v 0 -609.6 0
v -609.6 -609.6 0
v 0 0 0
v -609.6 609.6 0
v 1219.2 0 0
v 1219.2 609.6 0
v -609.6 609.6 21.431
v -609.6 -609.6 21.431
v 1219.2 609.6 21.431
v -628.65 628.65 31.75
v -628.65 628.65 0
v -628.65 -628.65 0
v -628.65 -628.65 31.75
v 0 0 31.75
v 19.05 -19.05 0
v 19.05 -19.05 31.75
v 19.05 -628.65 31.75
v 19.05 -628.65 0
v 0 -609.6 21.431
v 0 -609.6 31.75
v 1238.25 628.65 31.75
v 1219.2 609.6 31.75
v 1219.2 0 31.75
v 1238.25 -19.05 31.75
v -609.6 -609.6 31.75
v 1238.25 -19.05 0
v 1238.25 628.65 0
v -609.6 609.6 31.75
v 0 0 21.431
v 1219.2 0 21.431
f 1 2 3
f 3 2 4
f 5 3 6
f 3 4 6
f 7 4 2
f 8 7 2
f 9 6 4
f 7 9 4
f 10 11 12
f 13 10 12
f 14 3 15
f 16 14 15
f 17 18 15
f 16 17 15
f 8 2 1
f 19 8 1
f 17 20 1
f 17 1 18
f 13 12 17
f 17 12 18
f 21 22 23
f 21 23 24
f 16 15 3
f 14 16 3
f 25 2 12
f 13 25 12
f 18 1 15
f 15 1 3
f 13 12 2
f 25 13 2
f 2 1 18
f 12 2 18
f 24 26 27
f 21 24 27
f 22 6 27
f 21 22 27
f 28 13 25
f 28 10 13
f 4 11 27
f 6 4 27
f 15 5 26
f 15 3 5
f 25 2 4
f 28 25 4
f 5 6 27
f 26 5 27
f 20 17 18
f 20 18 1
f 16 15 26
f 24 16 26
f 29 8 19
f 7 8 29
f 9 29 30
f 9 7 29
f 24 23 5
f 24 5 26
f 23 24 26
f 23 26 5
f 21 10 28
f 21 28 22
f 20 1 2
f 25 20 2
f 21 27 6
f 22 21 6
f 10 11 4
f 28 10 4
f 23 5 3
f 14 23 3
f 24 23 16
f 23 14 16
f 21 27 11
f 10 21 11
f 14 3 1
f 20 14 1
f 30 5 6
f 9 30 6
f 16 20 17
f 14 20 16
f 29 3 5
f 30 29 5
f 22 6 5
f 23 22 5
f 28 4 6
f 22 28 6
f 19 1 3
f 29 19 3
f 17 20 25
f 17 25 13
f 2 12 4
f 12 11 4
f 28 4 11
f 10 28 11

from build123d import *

# Parameters (mm, degrees)
F1_DEPTH = 21.43125
F2_DEPTH = 31.75
F3_DEPTH = 31.75
F4_DEPTH = 31.75
F5_DEPTH = 31.75
F6_DEPTH = 31.75
F7_DEPTH = 31.75


with BuildPart() as f1:
    # F0 (on Top) → F1 (new body)
    with BuildSketch(Plane.XY):
        Polygon((-609.6, 609.6), (-609.6, -609.6), (0, -609.6), (0, 0), (1219.2, 0), (1219.2, 609.6), align=None)
    extrude(amount=F1_DEPTH)


with BuildPart() as f2:
    # F0 (on Top) → F2 (new body)
    with BuildSketch(Plane.XY):
        Polygon((-628.65, -628.65), (-609.6, -609.6), (-609.6, 609.6), (-628.65, 628.65), align=None)
    extrude(amount=F2_DEPTH)


with BuildPart() as f3:
    # F0 (on Top) → F3 (new body)
    with BuildSketch(Plane.XY):
        Polygon((0, -609.6), (-609.6, -609.6), (-628.65, -628.65), (19.05, -628.65), align=None)
    extrude(amount=F3_DEPTH)


with BuildPart() as f4:
    # F0 (on Top) → F4 (new body)
    with BuildSketch(Plane.XY):
        Polygon((0, 0), (0, -609.6), (19.05, -628.65), (19.05, -19.05), align=None)
    extrude(amount=F4_DEPTH)


with BuildPart() as f5:
    # F0 (on Top) → F5 (new body)
    with BuildSketch(Plane.XY):
        Polygon((1219.2, 0), (0, 0), (19.05, -19.05), (1238.25, -19.05), align=None)
    extrude(amount=F5_DEPTH)


with BuildPart() as f6:
    # F0 (on Top) → F6 (new body)
    with BuildSketch(Plane.XY):
        Polygon((1238.25, 628.65), (1219.2, 609.6), (1219.2, 0), (1238.25, -19.05), align=None)
    extrude(amount=F6_DEPTH)


with BuildPart() as f7:
    # F0 (on Top) → F7 (new body)
    with BuildSketch(Plane.XY):
        Polygon((-628.65, 628.65), (-609.6, 609.6), (1219.2, 609.6), (1238.25, 628.65), align=None)
    extrude(amount=F7_DEPTH)


solid = Compound([f1.part, f2.part, f3.part, f4.part, f5.part, f6.part, f7.part])
